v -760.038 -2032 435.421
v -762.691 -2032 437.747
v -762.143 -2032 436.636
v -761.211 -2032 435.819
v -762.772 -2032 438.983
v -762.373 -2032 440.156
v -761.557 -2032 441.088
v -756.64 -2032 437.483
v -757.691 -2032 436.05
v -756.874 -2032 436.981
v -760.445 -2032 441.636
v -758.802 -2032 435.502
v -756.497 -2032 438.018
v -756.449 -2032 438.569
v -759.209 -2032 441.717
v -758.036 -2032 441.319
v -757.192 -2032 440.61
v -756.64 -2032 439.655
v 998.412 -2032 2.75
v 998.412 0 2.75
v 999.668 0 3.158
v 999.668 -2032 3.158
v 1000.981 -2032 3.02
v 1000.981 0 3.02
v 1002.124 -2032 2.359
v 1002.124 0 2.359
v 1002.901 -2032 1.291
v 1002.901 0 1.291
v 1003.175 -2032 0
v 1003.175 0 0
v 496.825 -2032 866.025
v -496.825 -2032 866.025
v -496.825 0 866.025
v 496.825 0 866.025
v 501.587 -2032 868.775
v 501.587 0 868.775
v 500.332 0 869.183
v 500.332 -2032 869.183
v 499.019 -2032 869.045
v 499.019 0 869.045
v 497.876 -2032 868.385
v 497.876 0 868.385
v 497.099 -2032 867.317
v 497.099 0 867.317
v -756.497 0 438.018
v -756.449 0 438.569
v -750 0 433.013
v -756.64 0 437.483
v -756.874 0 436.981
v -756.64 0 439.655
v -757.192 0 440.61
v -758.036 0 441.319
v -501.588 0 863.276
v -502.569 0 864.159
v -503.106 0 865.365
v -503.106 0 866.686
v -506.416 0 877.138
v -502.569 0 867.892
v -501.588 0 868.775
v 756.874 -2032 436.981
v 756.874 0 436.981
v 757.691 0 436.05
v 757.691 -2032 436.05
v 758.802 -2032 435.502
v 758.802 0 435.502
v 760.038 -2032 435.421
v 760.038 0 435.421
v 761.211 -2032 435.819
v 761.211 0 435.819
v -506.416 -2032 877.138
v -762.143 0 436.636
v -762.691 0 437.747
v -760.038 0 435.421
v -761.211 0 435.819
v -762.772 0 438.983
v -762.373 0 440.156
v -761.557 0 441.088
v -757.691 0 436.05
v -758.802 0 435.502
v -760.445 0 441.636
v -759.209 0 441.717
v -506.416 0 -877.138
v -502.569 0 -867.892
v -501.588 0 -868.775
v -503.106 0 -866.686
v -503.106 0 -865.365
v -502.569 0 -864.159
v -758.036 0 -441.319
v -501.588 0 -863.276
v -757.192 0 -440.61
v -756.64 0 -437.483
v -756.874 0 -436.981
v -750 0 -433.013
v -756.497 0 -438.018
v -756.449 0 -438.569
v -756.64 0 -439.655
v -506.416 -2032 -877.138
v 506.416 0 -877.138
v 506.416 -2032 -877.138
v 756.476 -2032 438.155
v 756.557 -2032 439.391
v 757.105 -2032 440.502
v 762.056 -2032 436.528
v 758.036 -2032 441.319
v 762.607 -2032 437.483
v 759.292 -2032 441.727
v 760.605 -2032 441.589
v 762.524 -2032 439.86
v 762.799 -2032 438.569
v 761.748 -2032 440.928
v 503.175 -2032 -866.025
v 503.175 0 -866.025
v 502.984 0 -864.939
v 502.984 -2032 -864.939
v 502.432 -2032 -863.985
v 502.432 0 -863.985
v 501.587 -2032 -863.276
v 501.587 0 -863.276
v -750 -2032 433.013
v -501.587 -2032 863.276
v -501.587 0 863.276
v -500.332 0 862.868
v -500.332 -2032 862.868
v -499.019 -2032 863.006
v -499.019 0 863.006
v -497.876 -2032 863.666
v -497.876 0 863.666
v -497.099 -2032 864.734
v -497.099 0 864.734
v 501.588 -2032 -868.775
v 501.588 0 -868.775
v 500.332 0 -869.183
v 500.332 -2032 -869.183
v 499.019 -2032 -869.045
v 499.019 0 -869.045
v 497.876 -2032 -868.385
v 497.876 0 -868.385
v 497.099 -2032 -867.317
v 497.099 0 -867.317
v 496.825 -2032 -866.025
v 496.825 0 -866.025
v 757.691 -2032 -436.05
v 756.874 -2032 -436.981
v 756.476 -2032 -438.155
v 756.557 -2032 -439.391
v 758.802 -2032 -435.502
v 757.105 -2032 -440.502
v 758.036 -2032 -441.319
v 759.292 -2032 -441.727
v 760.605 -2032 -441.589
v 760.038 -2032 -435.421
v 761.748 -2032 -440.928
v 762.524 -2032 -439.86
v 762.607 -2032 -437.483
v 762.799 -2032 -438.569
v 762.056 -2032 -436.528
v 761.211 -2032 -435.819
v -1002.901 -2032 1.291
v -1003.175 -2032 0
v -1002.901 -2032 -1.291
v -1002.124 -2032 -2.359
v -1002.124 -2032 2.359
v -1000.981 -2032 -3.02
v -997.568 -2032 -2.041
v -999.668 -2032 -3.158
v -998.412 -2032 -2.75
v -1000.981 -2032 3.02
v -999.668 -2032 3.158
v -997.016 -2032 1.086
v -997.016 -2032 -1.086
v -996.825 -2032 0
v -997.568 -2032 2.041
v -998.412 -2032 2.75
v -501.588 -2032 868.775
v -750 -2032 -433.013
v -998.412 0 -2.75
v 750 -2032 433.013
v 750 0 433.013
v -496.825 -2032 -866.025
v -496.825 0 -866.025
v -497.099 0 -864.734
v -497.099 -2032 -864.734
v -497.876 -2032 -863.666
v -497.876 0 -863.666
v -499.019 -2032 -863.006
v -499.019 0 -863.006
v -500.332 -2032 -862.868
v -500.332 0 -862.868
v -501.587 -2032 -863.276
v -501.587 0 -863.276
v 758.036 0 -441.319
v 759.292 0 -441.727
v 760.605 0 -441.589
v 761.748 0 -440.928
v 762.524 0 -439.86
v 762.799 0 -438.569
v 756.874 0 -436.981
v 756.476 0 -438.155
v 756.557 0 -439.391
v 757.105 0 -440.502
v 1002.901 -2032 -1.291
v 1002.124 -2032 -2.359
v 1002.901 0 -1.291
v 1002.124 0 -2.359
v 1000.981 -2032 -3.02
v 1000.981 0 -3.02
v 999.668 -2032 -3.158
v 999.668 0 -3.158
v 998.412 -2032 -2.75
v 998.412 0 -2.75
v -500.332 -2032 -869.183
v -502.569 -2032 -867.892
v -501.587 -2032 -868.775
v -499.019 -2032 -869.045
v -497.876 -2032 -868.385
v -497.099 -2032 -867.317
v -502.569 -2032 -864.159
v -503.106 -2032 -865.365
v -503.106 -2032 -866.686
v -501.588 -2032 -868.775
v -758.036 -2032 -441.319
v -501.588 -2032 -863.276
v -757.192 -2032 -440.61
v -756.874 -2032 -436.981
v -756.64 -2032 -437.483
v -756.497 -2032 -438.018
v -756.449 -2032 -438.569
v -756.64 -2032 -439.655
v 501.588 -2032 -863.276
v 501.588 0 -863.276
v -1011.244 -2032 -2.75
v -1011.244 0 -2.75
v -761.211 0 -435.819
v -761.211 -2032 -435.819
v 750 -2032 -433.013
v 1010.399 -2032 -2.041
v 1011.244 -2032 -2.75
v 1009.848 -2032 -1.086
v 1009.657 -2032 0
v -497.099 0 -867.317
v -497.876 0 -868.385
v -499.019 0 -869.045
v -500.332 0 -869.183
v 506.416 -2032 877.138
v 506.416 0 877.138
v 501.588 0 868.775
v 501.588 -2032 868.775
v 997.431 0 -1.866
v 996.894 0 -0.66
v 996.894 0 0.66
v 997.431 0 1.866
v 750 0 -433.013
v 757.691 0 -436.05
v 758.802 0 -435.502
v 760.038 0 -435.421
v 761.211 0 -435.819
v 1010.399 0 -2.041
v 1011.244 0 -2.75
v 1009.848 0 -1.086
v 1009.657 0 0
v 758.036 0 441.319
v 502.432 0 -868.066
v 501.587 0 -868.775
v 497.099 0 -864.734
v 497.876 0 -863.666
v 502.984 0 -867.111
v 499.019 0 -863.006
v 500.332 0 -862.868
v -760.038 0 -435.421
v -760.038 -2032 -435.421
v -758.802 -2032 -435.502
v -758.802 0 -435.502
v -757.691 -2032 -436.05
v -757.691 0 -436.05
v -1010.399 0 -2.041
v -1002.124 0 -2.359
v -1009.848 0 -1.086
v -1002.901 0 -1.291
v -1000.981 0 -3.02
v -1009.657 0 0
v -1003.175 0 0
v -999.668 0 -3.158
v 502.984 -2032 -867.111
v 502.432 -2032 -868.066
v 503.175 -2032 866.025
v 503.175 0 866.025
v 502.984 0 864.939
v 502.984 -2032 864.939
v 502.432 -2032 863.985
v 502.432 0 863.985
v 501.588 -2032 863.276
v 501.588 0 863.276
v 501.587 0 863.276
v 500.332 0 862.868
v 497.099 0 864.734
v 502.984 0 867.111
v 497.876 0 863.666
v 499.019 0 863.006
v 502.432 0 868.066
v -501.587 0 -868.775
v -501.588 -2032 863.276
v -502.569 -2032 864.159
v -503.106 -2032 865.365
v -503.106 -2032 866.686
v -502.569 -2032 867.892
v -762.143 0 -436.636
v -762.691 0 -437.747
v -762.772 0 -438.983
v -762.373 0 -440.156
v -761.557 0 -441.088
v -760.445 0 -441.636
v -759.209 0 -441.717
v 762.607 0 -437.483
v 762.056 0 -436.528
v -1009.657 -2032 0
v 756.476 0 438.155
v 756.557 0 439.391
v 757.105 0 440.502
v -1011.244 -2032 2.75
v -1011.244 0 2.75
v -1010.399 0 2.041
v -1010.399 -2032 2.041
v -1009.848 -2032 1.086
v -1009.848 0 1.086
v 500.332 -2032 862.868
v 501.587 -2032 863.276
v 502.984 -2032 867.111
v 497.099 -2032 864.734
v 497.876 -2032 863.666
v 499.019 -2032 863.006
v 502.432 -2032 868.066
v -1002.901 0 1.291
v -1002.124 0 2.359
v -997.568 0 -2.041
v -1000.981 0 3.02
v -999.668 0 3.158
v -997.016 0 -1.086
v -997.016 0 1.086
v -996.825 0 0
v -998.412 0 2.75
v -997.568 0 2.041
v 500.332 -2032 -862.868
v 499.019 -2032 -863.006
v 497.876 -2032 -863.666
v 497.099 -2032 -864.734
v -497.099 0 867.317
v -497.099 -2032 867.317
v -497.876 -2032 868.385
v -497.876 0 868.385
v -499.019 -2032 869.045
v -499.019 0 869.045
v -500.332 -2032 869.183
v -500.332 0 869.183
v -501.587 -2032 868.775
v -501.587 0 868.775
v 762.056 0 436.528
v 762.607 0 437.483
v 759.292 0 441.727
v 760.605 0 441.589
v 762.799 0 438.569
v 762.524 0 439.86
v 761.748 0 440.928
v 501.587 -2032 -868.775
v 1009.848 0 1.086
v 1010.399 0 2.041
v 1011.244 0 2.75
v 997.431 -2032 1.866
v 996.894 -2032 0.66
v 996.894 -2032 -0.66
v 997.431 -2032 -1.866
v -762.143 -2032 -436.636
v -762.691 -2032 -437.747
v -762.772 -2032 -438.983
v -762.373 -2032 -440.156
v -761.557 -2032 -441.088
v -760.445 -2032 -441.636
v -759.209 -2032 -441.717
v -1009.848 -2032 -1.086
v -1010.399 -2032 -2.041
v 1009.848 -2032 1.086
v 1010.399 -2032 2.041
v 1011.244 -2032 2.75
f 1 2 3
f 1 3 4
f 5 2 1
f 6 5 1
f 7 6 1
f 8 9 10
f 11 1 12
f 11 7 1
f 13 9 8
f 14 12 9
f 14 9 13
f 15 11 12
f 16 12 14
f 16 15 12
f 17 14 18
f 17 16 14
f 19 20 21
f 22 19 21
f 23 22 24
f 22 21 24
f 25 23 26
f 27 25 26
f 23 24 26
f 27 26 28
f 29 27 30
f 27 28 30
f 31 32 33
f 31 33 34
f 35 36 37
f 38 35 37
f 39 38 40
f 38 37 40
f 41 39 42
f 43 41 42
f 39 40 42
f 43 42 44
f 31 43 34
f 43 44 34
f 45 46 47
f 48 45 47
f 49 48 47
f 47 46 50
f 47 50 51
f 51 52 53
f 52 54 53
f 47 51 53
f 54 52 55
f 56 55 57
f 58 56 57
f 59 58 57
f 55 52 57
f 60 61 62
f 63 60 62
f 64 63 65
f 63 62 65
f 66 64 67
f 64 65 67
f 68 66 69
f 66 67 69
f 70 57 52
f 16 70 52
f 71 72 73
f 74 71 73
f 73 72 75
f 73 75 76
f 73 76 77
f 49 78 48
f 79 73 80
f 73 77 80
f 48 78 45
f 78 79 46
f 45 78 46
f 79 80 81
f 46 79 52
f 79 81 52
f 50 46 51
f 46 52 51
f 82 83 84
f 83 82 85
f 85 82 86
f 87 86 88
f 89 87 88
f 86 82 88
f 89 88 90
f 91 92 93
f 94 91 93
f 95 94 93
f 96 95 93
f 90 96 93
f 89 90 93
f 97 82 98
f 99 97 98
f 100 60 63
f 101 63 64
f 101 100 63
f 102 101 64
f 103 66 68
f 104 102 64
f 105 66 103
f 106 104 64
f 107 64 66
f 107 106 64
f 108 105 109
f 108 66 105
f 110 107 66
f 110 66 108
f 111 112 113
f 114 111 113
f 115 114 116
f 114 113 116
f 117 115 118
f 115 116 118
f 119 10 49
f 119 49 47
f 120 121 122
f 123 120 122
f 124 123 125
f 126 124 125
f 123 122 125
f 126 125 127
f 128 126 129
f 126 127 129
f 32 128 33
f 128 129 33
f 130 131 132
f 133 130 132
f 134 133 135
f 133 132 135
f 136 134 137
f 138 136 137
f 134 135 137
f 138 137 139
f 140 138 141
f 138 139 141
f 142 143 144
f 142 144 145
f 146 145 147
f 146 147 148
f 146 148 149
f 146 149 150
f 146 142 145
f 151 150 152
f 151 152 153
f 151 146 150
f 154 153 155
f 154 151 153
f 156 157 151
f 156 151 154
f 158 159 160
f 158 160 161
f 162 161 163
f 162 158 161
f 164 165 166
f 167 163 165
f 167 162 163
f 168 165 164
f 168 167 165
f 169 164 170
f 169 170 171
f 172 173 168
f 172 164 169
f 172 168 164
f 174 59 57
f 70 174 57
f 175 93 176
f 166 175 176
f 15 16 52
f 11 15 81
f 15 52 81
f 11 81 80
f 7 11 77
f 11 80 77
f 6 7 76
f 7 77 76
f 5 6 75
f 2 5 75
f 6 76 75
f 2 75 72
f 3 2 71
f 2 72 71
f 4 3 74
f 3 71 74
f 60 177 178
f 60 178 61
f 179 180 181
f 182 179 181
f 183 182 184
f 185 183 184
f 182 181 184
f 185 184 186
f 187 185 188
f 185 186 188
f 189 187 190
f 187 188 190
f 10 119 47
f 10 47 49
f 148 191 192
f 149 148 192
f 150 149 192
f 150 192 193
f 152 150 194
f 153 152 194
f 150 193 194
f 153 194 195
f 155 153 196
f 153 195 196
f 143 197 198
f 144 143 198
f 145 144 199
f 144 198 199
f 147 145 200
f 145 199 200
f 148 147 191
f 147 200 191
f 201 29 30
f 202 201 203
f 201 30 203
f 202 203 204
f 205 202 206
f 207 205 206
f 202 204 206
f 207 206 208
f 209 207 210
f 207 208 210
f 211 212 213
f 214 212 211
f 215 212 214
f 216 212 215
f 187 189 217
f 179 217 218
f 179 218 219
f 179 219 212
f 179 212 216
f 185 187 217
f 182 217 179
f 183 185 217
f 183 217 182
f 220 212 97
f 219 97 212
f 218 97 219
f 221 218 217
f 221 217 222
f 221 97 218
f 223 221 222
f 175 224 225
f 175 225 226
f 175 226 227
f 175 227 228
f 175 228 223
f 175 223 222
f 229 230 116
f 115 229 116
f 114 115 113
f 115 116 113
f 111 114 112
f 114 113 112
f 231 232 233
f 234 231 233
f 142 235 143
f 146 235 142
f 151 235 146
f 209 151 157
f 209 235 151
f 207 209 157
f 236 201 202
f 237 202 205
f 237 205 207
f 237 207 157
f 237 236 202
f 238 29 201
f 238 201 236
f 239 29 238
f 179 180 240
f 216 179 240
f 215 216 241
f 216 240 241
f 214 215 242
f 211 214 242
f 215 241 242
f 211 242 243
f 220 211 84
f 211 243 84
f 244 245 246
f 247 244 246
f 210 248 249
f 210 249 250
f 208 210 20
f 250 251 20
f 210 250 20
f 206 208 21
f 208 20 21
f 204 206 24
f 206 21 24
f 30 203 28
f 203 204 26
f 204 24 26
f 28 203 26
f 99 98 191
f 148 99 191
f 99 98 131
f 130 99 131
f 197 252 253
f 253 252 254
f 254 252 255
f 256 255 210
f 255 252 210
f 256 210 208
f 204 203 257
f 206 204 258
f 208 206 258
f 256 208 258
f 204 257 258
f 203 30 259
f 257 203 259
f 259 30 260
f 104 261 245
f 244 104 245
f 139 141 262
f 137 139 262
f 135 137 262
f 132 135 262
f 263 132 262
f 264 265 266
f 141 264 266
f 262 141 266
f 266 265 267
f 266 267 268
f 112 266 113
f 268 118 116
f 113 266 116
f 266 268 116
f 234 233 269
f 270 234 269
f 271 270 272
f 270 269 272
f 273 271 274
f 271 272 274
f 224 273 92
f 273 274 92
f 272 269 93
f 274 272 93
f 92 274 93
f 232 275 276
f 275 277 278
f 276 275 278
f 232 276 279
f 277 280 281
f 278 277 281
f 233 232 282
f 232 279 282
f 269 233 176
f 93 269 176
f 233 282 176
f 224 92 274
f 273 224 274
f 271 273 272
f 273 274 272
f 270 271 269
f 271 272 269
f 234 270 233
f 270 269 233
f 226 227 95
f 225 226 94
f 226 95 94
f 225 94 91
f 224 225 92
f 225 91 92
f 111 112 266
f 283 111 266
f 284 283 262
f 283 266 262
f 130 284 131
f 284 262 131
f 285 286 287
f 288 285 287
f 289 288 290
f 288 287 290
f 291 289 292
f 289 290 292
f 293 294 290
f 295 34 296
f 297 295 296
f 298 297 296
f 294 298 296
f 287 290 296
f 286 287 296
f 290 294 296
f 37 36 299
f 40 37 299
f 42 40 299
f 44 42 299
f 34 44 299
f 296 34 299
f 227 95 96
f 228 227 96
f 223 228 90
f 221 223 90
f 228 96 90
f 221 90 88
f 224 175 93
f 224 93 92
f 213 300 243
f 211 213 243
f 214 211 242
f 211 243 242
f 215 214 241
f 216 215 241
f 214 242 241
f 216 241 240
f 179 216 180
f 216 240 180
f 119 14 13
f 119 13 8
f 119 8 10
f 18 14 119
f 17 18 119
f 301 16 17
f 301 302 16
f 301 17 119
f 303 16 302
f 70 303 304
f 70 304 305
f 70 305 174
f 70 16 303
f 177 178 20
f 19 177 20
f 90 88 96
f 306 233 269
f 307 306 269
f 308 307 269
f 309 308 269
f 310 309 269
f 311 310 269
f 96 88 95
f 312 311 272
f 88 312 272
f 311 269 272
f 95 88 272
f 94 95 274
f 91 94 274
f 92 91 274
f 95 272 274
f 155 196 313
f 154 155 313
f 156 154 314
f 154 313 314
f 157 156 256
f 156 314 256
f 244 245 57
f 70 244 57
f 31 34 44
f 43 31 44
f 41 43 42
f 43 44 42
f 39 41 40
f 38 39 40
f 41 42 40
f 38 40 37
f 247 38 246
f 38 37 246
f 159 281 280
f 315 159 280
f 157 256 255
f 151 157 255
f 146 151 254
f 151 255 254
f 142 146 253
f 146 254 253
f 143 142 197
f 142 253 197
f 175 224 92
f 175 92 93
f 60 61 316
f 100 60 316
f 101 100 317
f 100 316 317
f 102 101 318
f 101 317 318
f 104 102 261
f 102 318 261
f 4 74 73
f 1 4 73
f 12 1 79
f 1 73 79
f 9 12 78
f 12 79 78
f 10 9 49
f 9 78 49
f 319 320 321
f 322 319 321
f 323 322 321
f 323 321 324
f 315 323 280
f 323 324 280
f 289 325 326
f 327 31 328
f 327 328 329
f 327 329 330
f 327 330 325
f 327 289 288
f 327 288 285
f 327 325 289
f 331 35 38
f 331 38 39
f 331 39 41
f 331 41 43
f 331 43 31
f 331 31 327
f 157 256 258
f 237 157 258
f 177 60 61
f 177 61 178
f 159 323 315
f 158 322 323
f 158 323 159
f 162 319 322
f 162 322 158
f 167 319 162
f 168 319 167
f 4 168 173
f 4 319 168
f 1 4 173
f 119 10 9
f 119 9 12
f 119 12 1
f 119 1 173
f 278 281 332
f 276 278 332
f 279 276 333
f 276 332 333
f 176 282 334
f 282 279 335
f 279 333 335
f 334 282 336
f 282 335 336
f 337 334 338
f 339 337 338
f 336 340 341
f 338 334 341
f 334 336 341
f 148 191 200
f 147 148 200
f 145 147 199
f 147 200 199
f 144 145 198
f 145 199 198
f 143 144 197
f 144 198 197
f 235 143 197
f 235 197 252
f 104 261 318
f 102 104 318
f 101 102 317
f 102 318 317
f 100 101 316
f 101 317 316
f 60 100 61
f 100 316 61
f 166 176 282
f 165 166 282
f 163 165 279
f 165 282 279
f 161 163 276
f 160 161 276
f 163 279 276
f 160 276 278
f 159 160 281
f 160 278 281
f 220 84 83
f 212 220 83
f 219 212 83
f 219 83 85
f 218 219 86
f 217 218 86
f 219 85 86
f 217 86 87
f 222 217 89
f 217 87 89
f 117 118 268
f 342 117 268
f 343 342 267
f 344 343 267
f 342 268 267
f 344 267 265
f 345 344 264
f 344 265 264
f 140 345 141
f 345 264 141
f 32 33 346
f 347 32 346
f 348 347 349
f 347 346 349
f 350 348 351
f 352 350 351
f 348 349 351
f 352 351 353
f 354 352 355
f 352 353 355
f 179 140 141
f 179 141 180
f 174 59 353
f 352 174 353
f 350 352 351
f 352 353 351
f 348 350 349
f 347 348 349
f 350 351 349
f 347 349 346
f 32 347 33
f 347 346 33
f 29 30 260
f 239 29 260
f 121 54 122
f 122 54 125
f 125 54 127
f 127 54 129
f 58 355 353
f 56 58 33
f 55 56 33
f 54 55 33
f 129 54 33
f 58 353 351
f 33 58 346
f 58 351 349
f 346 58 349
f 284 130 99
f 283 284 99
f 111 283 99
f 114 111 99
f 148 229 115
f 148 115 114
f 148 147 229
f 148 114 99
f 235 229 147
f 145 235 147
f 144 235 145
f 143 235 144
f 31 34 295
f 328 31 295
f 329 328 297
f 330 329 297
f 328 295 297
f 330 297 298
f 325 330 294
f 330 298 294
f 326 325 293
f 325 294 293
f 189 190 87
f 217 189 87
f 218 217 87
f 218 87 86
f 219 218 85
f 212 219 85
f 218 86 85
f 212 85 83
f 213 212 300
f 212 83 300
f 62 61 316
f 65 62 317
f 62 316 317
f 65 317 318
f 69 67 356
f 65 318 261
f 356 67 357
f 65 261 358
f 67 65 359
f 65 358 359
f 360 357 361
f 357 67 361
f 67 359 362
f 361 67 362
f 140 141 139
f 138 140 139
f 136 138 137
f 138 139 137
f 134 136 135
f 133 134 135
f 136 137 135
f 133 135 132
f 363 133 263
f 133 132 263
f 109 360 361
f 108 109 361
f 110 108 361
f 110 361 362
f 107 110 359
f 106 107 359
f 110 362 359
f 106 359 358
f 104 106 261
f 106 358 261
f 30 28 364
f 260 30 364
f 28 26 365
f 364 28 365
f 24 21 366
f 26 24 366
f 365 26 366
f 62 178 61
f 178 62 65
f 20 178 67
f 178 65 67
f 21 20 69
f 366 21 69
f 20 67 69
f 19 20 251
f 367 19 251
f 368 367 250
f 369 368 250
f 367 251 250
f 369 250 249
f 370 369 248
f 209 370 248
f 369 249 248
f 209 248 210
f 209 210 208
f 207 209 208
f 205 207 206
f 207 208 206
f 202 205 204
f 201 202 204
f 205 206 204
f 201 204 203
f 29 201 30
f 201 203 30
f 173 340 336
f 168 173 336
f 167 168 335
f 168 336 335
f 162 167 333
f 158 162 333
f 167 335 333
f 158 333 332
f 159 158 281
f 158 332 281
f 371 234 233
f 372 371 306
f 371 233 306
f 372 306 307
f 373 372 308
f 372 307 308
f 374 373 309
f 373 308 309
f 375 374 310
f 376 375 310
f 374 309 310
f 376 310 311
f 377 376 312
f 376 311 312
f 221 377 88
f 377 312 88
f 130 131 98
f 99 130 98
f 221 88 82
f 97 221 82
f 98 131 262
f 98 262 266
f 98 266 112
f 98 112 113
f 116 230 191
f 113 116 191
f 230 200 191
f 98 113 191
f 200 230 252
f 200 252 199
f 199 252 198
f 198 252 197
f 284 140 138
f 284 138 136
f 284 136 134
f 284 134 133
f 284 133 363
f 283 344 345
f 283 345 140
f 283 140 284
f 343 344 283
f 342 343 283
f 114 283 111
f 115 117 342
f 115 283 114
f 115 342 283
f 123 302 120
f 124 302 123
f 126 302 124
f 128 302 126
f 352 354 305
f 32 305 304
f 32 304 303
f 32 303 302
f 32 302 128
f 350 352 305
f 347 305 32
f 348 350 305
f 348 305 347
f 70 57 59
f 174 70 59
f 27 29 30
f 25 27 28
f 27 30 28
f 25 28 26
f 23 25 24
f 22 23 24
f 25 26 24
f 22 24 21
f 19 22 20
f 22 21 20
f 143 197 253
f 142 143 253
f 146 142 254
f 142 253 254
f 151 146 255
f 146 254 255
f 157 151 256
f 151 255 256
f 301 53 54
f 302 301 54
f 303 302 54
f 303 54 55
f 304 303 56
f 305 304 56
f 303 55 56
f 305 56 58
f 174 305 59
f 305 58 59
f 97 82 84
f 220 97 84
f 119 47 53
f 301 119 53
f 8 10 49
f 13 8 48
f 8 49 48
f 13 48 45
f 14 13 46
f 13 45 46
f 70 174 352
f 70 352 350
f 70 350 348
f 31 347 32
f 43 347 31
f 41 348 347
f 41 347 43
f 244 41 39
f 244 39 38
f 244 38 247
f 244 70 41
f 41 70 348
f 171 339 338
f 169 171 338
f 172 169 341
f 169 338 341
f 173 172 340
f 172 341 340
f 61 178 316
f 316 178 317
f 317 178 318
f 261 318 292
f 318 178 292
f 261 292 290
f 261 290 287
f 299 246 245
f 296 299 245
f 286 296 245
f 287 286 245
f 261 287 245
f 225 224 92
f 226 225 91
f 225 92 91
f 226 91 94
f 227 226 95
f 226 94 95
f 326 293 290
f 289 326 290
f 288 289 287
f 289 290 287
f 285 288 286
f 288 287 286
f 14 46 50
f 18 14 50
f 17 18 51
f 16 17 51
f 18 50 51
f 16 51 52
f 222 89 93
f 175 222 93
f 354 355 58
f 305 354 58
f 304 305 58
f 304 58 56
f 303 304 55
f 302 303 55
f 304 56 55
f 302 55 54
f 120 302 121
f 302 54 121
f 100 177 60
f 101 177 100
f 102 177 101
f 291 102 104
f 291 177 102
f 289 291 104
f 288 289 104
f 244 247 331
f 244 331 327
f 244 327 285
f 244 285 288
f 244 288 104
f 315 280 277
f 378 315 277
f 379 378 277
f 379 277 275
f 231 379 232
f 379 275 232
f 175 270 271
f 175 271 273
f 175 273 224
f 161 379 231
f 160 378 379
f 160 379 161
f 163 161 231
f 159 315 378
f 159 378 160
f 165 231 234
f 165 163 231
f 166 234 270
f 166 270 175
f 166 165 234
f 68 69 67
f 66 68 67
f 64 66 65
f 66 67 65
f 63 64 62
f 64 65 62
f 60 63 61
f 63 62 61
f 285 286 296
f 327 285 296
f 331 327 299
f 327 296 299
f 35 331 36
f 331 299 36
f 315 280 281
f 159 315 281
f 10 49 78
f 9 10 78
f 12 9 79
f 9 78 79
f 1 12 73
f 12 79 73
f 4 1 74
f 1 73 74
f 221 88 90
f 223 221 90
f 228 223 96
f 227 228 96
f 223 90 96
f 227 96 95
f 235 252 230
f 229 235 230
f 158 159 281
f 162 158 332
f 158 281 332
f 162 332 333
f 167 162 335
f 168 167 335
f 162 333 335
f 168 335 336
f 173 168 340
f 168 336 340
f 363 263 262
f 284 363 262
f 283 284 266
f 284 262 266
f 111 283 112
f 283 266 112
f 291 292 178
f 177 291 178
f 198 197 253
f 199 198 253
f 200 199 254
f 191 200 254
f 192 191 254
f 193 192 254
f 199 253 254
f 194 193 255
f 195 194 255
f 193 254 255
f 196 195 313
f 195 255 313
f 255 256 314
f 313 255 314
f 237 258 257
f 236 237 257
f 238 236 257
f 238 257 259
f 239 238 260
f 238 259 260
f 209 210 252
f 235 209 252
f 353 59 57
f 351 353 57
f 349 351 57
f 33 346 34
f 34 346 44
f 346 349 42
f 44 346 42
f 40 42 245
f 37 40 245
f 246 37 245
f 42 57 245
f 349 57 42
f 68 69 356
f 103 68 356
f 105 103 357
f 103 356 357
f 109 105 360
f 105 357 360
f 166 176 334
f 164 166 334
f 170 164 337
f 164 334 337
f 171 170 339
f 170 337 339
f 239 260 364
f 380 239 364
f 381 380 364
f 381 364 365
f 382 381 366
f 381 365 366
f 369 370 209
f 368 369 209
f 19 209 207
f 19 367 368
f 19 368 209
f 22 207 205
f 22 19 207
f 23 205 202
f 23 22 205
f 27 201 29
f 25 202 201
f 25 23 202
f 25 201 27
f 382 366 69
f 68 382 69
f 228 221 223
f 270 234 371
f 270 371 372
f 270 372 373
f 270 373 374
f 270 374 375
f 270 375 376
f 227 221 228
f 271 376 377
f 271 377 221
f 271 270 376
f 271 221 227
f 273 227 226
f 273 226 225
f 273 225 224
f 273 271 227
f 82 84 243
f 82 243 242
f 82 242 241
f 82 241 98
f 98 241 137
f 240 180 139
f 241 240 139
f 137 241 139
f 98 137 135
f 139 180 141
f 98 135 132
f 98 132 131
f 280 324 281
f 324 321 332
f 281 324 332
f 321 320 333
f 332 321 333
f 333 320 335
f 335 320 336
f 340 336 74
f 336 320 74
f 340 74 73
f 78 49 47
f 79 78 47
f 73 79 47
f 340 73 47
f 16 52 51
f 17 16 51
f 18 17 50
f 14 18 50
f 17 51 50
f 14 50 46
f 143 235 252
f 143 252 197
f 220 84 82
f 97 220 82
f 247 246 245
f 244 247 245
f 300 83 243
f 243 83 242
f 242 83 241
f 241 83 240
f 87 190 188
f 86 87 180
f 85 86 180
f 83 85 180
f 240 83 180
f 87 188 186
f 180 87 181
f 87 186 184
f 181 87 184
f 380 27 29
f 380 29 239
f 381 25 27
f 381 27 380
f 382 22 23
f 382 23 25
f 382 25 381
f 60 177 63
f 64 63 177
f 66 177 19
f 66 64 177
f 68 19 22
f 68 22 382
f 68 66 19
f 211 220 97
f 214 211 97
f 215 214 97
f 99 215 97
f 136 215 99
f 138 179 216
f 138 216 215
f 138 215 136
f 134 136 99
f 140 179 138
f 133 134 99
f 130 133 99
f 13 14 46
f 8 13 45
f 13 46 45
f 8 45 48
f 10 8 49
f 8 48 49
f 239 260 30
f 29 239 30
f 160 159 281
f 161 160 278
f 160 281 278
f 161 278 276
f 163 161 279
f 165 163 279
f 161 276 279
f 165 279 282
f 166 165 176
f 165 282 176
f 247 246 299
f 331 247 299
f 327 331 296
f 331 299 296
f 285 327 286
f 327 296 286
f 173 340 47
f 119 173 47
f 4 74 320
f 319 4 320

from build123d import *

# Parameters (mm, degrees)
F1_DEPTH = 2032
F2_DEPTH = 2032
F3_DEPTH = 2032


with BuildPart() as f1:
    # F0 (on Front) → F1 (new body)
    with BuildSketch(Plane.XZ):
        with BuildLine():
            Line((496.825, -866.0254037844), (-496.825, -866.0254037844))
            ThreePointArc((-496.825, -866.0254037844), (-498.4125, -868.7750344415), (-501.5875, -868.7750344415))
            Line((-501.5875, -868.7750344415), (-506.4158048664, -877.1379037844))
            Line((-506.4158048664, -877.1379037844), (506.4158048664, -877.1379037844))
            Line((506.4158048664, -877.1379037844), (501.5875, -868.7750344415))
            ThreePointArc((501.5875, -868.7750344415), (498.4125, -868.7750344415), (496.825, -866.0254037844))
        make_face()
    extrude(amount=F1_DEPTH)


with BuildPart() as f1b:
    # F0 (on Front) → F1, piece 2 (new body)
    with BuildSketch(Plane.XZ):
        with BuildLine():
            Line((998.4125, -2.749630657), (750, -433.0127018922))
            Line((750, -433.0127018922), (756.8740766425, -436.9814518922))
            ThreePointArc((756.8740766425, -436.9814518922), (758.8019568314, -435.5021373938), (761.2112072996, -435.8193212352))
            Line((761.2112072996, -435.8193212352), (1011.2441097327, -2.749630657))
            ThreePointArc((1011.2441097327, -2.749630657), (1010.0819790757, -1.5875), (1009.6566097327, 0))
            Line((1009.6566097327, 0), (1003.175, 0))
            ThreePointArc((1003.175, 0), (1001.5875, -2.749630657), (998.4125, -2.749630657))
        make_face()
    extrude(amount=F1_DEPTH)


with BuildPart() as f1c:
    # F0 (on Front) → F1, piece 3 (new body)
    with BuildSketch(Plane.XZ):
        with BuildLine():
            Line((501.5875, 863.2757731274), (750, 433.0127018922))
            Line((750, 433.0127018922), (756.8740766425, 436.9814518922))
            ThreePointArc((756.8740766425, 436.9814518922), (756.5568928011, 439.3907023604), (758.0362072996, 441.3185825492))
            Line((758.0362072996, 441.3185825492), (506.4158048664, 877.1379037844))
            Line((506.4158048664, 877.1379037844), (501.5875, 868.7750344415))
            ThreePointArc((501.5875, 868.7750344415), (502.749630657, 867.6129037844), (503.175, 866.0254037844))
            ThreePointArc((503.175, 866.0254037844), (502.749630657, 864.4379037844), (501.5875, 863.2757731274))
        make_face()
    extrude(amount=F1_DEPTH)


with BuildPart() as f1d:
    # F0 (on Front) → F1, piece 4 (new body)
    with BuildSketch(Plane.XZ):
        with BuildLine():
            Line((-756.8740766425, -436.9814518922), (-750, -433.0127018922))
            Line((-750, -433.0127018922), (-998.4125, -2.749630657))
            ThreePointArc((-998.4125, -2.749630657), (-1001.5875, -2.749630657), (-1003.175, 0))
            Line((-1003.175, 0), (-1009.6566097327, 0))
            ThreePointArc((-1009.6566097327, 0), (-1010.0819790757, -1.5875), (-1011.2441097327, -2.749630657))
            Line((-1011.2441097327, -2.749630657), (-761.2112072996, -435.8193212352))
            ThreePointArc((-761.2112072996, -435.8193212352), (-758.8019568314, -435.5021373938), (-756.8740766425, -436.9814518922))
        make_face()
    extrude(amount=F1_DEPTH)


with BuildPart() as f1e:
    # F0 (on Front) → F1, piece 5 (new body)
    with BuildSketch(Plane.XZ):
        with BuildLine():
            Line((-756.8740766425, 436.9814518922), (-750, 433.0127018922))
            Line((-750, 433.0127018922), (-501.5875, 863.2757731274))
            ThreePointArc((-501.5875, 863.2757731274), (-503.175, 866.0254037844), (-501.5875, 868.7750344415))
            Line((-501.5875, 868.7750344415), (-506.4158048664, 877.1379037844))
            Line((-506.4158048664, 877.1379037844), (-758.0362072996, 441.3185825492))
            ThreePointArc((-758.0362072996, 441.3185825492), (-756.8740766425, 440.1564518922), (-756.4487072996, 438.5689518922))
            ThreePointArc((-756.4487072996, 438.5689518922), (-756.5568928011, 437.747201424), (-756.8740766425, 436.9814518922))
        make_face()
    extrude(amount=F1_DEPTH)


with BuildPart() as f2:
    # F0 (on Front) → F2 (new body)
    with BuildSketch(Plane.XZ):
        with BuildLine():
            Line((750, 433.0127018922), (998.4125, 2.749630657))
            ThreePointArc((998.4125, 2.749630657), (1001.5875, 2.749630657), (1003.175, 0))
            Line((1003.175, 0), (1009.6566097327, 0))
            ThreePointArc((1009.6566097327, 0), (1010.0819790757, 1.5875), (1011.2441097327, 2.749630657))
            Line((1011.2441097327, 2.749630657), (761.2112072996, 435.8193212352))
            ThreePointArc((761.2112072996, 435.8193212352), (758.8019568314, 435.5021373938), (756.8740766425, 436.9814518922))
            Line((756.8740766425, 436.9814518922), (750, 433.0127018922))
        make_face()
    extrude(amount=F2_DEPTH)


with BuildPart() as f2b:
    # F0 (on Front) → F2, piece 2 (new body)
    with BuildSketch(Plane.XZ):
        with BuildLine():
            Line((-496.825, 866.0254037844), (496.825, 866.0254037844))
            ThreePointArc((496.825, 866.0254037844), (498.4125, 868.7750344415), (501.5875, 868.7750344415))
            Line((501.5875, 868.7750344415), (506.4158048664, 877.1379037844))
            Line((506.4158048664, 877.1379037844), (-506.4158048664, 877.1379037844))
            Line((-506.4158048664, 877.1379037844), (-501.5875, 868.7750344415))
            ThreePointArc((-501.5875, 868.7750344415), (-498.4125, 868.7750344415), (-496.825, 866.0254037844))
        make_face()
    extrude(amount=F2_DEPTH)


with BuildPart() as f2c:
    # F0 (on Front) → F2, piece 3 (new body)
    with BuildSketch(Plane.XZ):
        with BuildLine():
            Line((-1009.6566097327, 0), (-1003.175, 0))
            ThreePointArc((-1003.175, 0), (-1001.5875, 2.749630657), (-998.4125, 2.749630657))
            Line((-998.4125, 2.749630657), (-750, 433.0127018922))
            Line((-750, 433.0127018922), (-756.8740766425, 436.9814518922))
            ThreePointArc((-756.8740766425, 436.9814518922), (-758.8019568314, 435.5021373938), (-761.2112072996, 435.8193212352))
            Line((-761.2112072996, 435.8193212352), (-1011.2441097327, 2.749630657))
            ThreePointArc((-1011.2441097327, 2.749630657), (-1010.0819790757, 1.5875), (-1009.6566097327, 0))
        make_face()
    extrude(amount=F2_DEPTH)


with BuildPart() as f2d:
    # F0 (on Front) → F2, piece 4 (new body)
    with BuildSketch(Plane.XZ):
        with BuildLine():
            ThreePointArc((-501.5875, -868.7750344415), (-503.175, -866.0254037844), (-501.5875, -863.2757731274))
            Line((-501.5875, -863.2757731274), (-750, -433.0127018922))
            Line((-750, -433.0127018922), (-756.8740766425, -436.9814518922))
            ThreePointArc((-756.8740766425, -436.9814518922), (-756.5568928011, -437.747201424), (-756.4487072996, -438.5689518922))
            ThreePointArc((-756.4487072996, -438.5689518922), (-756.8740766425, -440.1564518922), (-758.0362072996, -441.3185825492))
            Line((-758.0362072996, -441.3185825492), (-506.4158048664, -877.1379037844))
            Line((-506.4158048664, -877.1379037844), (-501.5875, -868.7750344415))
        make_face()
    extrude(amount=F2_DEPTH)


with BuildPart() as f2e:
    # F0 (on Front) → F2, piece 5 (new body)
    with BuildSketch(Plane.XZ):
        with BuildLine():
            Line((750, -433.0127018922), (501.5875, -863.2757731274))
            ThreePointArc((501.5875, -863.2757731274), (502.749630657, -864.4379037844), (503.175, -866.0254037844))
            ThreePointArc((503.175, -866.0254037844), (502.749630657, -867.6129037844), (501.5875, -868.7750344415))
            Line((501.5875, -868.7750344415), (506.4158048664, -877.1379037844))
            Line((506.4158048664, -877.1379037844), (758.0362072996, -441.3185825492))
            ThreePointArc((758.0362072996, -441.3185825492), (756.5568928011, -439.3907023604), (756.8740766425, -436.9814518922))
            Line((756.8740766425, -436.9814518922), (750, -433.0127018922))
        make_face()
    extrude(amount=F2_DEPTH)


with BuildPart() as f3:
    # F0 (on Front) → F3 (new body)
    with BuildSketch(Plane.XZ):
        with BuildLine():
            ThreePointArc((-761.2112072996, -435.8193212352), (-762.3733379566, -440.1564518922), (-758.0362072996, -441.3185825492))
            Line((-758.0362072996, -441.3185825492), (-759.6237072996, -438.5689518922))
            Line((-759.6237072996, -438.5689518922), (-761.2112072996, -435.8193212352))
        make_face()
        with BuildLine():
            Line((-759.6237072996, -438.5689518922), (-756.8740766425, -436.9814518922))
            ThreePointArc((-756.8740766425, -436.9814518922), (-758.8019568314, -435.5021373938), (-761.2112072996, -435.8193212352))
            Line((-761.2112072996, -435.8193212352), (-759.6237072996, -438.5689518922))
        make_face()
        with BuildLine():
            ThreePointArc((-756.4487072996, -438.5689518922), (-756.5568928011, -437.747201424), (-756.8740766425, -436.9814518922))
            Line((-756.8740766425, -436.9814518922), (-759.6237072996, -438.5689518922))
            Line((-759.6237072996, -438.5689518922), (-758.0362072996, -441.3185825492))
            ThreePointArc((-758.0362072996, -441.3185825492), (-756.8740766425, -440.1564518922), (-756.4487072996, -438.5689518922))
        make_face()
    extrude(amount=F3_DEPTH)


with BuildPart() as f3b:
    # F0 (on Front) → F3, piece 2 (new body)
    with BuildSketch(Plane.XZ):
        with BuildLine():
            Line((-500, -866.0254037844), (-496.825, -866.0254037844))
            ThreePointArc((-496.825, -866.0254037844), (-498.4125, -863.2757731274), (-501.5875, -863.2757731274))
            Line((-501.5875, -863.2757731274), (-500, -866.0254037844))
        make_face()
        with BuildLine():
            ThreePointArc((-501.5875, -868.7750344415), (-498.4125, -868.7750344415), (-496.825, -866.0254037844))
            Line((-496.825, -866.0254037844), (-500, -866.0254037844))
            Line((-500, -866.0254037844), (-501.5875, -868.7750344415))
        make_face()
        with BuildLine():
            Line((-501.5875, -868.7750344415), (-500, -866.0254037844))
            Line((-500, -866.0254037844), (-501.5875, -863.2757731274))
            ThreePointArc((-501.5875, -863.2757731274), (-503.175, -866.0254037844), (-501.5875, -868.7750344415))
        make_face()
    extrude(amount=F3_DEPTH)


with BuildPart() as f3c:
    # F0 (on Front) → F3, piece 3 (new body)
    with BuildSketch(Plane.XZ):
        with BuildLine():
            Line((501.5875, -863.2757731274), (500, -866.0254037844))
            Line((500, -866.0254037844), (501.5875, -868.7750344415))
            ThreePointArc((501.5875, -868.7750344415), (502.749630657, -867.6129037844), (503.175, -866.0254037844))
            ThreePointArc((503.175, -866.0254037844), (502.749630657, -864.4379037844), (501.5875, -863.2757731274))
        make_face()
        with BuildLine():
            ThreePointArc((501.5875, -863.2757731274), (498.4125, -863.2757731274), (496.825, -866.0254037844))
            Line((496.825, -866.0254037844), (500, -866.0254037844))
            Line((500, -866.0254037844), (501.5875, -863.2757731274))
        make_face()
        with BuildLine():
            Line((500, -866.0254037844), (496.825, -866.0254037844))
            ThreePointArc((496.825, -866.0254037844), (498.4125, -868.7750344415), (501.5875, -868.7750344415))
            Line((501.5875, -868.7750344415), (500, -866.0254037844))
        make_face()
    extrude(amount=F3_DEPTH)


with BuildPart() as f3d:
    # F0 (on Front) → F3, piece 4 (new body)
    with BuildSketch(Plane.XZ):
        with BuildLine():
            ThreePointArc((761.2112072996, -435.8193212352), (758.8019568314, -435.5021373938), (756.8740766425, -436.9814518922))
            Line((756.8740766425, -436.9814518922), (759.6237072996, -438.5689518922))
            Line((759.6237072996, -438.5689518922), (761.2112072996, -435.8193212352))
        make_face()
        with BuildLine():
            Line((759.6237072996, -438.5689518922), (756.8740766425, -436.9814518922))
            ThreePointArc((756.8740766425, -436.9814518922), (756.5568928011, -439.3907023604), (758.0362072996, -441.3185825492))
            Line((758.0362072996, -441.3185825492), (759.6237072996, -438.5689518922))
        make_face()
        with BuildLine():
            Line((759.6237072996, -438.5689518922), (758.0362072996, -441.3185825492))
            ThreePointArc((758.0362072996, -441.3185825492), (761.2112072996, -441.3185825492), (762.7987072996, -438.5689518922))
            ThreePointArc((762.7987072996, -438.5689518922), (762.3733379566, -436.9814518922), (761.2112072996, -435.8193212352))
            Line((761.2112072996, -435.8193212352), (759.6237072996, -438.5689518922))
        make_face()
    extrude(amount=F3_DEPTH)


with BuildPart() as f3e:
    # F0 (on Front) → F3, piece 5 (new body)
    with BuildSketch(Plane.XZ):
        with BuildLine():
            Line((998.4125, 2.749630657), (1000, 0))
            Line((1000, 0), (1003.175, 0))
            ThreePointArc((1003.175, 0), (1001.5875, 2.749630657), (998.4125, 2.749630657))
        make_face()
        with BuildLine():
            Line((1000, 0), (998.4125, -2.749630657))
            ThreePointArc((998.4125, -2.749630657), (1001.5875, -2.749630657), (1003.175, 0))
            Line((1003.175, 0), (1000, 0))
        make_face()
        with BuildLine():
            ThreePointArc((998.4125, 2.749630657), (996.825, 0), (998.4125, -2.749630657))
            Line((998.4125, -2.749630657), (1000, 0))
            Line((1000, 0), (998.4125, 2.749630657))
        make_face()
    extrude(amount=F3_DEPTH)


with BuildPart() as f3f:
    # F0 (on Front) → F3, piece 6 (new body)
    with BuildSketch(Plane.XZ):
        with BuildLine():
            Line((758.0362072996, 441.3185825492), (759.6237072996, 438.5689518922))
            Line((759.6237072996, 438.5689518922), (761.2112072996, 435.8193212352))
            ThreePointArc((761.2112072996, 435.8193212352), (762.3733379566, 436.9814518922), (762.7987072996, 438.5689518922))
            ThreePointArc((762.7987072996, 438.5689518922), (761.2112072996, 441.3185825492), (758.0362072996, 441.3185825492))
        make_face()
        with BuildLine():
            Line((759.6237072996, 438.5689518922), (756.8740766425, 436.9814518922))
            ThreePointArc((756.8740766425, 436.9814518922), (758.8019568314, 435.5021373938), (761.2112072996, 435.8193212352))
            Line((761.2112072996, 435.8193212352), (759.6237072996, 438.5689518922))
        make_face()
        with BuildLine():
            ThreePointArc((758.0362072996, 441.3185825492), (756.5568928011, 439.3907023604), (756.8740766425, 436.9814518922))
            Line((756.8740766425, 436.9814518922), (759.6237072996, 438.5689518922))
            Line((759.6237072996, 438.5689518922), (758.0362072996, 441.3185825492))
        make_face()
    extrude(amount=F3_DEPTH)


with BuildPart() as f3g:
    # F0 (on Front) → F3, piece 7 (new body)
    with BuildSketch(Plane.XZ):
        with BuildLine():
            Line((496.825, 866.0254037844), (500, 866.0254037844))
            Line((500, 866.0254037844), (501.5875, 868.7750344415))
            ThreePointArc((501.5875, 868.7750344415), (498.4125, 868.7750344415), (496.825, 866.0254037844))
        make_face()
        with BuildLine():
            ThreePointArc((496.825, 866.0254037844), (498.4125, 863.2757731274), (501.5875, 863.2757731274))
            Line((501.5875, 863.2757731274), (500, 866.0254037844))
            Line((500, 866.0254037844), (496.825, 866.0254037844))
        make_face()
        with BuildLine():
            Line((500, 866.0254037844), (501.5875, 863.2757731274))
            ThreePointArc((501.5875, 863.2757731274), (502.749630657, 864.4379037844), (503.175, 866.0254037844))
            ThreePointArc((503.175, 866.0254037844), (502.749630657, 867.6129037844), (501.5875, 868.7750344415))
            Line((501.5875, 868.7750344415), (500, 866.0254037844))
        make_face()
    extrude(amount=F3_DEPTH)


with BuildPart() as f3h:
    # F0 (on Front) → F3, piece 8 (new body)
    with BuildSketch(Plane.XZ):
        with BuildLine():
            Line((-500, 866.0254037844), (-501.5875, 863.2757731274))
            ThreePointArc((-501.5875, 863.2757731274), (-498.4125, 863.2757731274), (-496.825, 866.0254037844))
            Line((-496.825, 866.0254037844), (-500, 866.0254037844))
        make_face()
        with BuildLine():
            Line((-501.5875, 868.7750344415), (-500, 866.0254037844))
            Line((-500, 866.0254037844), (-496.825, 866.0254037844))
            ThreePointArc((-496.825, 866.0254037844), (-498.4125, 868.7750344415), (-501.5875, 868.7750344415))
        make_face()
        with BuildLine():
            ThreePointArc((-501.5875, 868.7750344415), (-503.175, 866.0254037844), (-501.5875, 863.2757731274))
            Line((-501.5875, 863.2757731274), (-500, 866.0254037844))
            Line((-500, 866.0254037844), (-501.5875, 868.7750344415))
        make_face()
    extrude(amount=F3_DEPTH)


with BuildPart() as f3i:
    # F0 (on Front) → F3, piece 9 (new body)
    with BuildSketch(Plane.XZ):
        with BuildLine():
            Line((-759.6237072996, 438.5689518922), (-756.8740766425, 436.9814518922))
            ThreePointArc((-756.8740766425, 436.9814518922), (-756.5568928011, 437.747201424), (-756.4487072996, 438.5689518922))
            ThreePointArc((-756.4487072996, 438.5689518922), (-756.8740766425, 440.1564518922), (-758.0362072996, 441.3185825492))
            Line((-758.0362072996, 441.3185825492), (-759.6237072996, 438.5689518922))
        make_face()
        with BuildLine():
            ThreePointArc((-758.0362072996, 441.3185825492), (-762.3733379566, 440.1564518922), (-761.2112072996, 435.8193212352))
            Line((-761.2112072996, 435.8193212352), (-759.6237072996, 438.5689518922))
            Line((-759.6237072996, 438.5689518922), (-758.0362072996, 441.3185825492))
        make_face()
        with BuildLine():
            ThreePointArc((-761.2112072996, 435.8193212352), (-758.8019568314, 435.5021373938), (-756.8740766425, 436.9814518922))
            Line((-756.8740766425, 436.9814518922), (-759.6237072996, 438.5689518922))
            Line((-759.6237072996, 438.5689518922), (-761.2112072996, 435.8193212352))
        make_face()
    extrude(amount=F3_DEPTH)


with BuildPart() as f3j:
    # F0 (on Front) → F3, piece 10 (new body)
    with BuildSketch(Plane.XZ):
        with BuildLine():
            Line((-1000, 0), (-998.4125, -2.749630657))
            ThreePointArc((-998.4125, -2.749630657), (-997.250369343, -1.5875), (-996.825, 0))
            ThreePointArc((-996.825, 0), (-997.250369343, 1.5875), (-998.4125, 2.749630657))
            Line((-998.4125, 2.749630657), (-1000, 0))
        make_face()
        with BuildLine():
            Line((-1003.175, 0), (-1000, 0))
            Line((-1000, 0), (-998.4125, 2.749630657))
            ThreePointArc((-998.4125, 2.749630657), (-1001.5875, 2.749630657), (-1003.175, 0))
        make_face()
        with BuildLine():
            ThreePointArc((-1003.175, 0), (-1001.5875, -2.749630657), (-998.4125, -2.749630657))
            Line((-998.4125, -2.749630657), (-1000, 0))
            Line((-1000, 0), (-1003.175, 0))
        make_face()
    extrude(amount=F3_DEPTH)


solid = Compound([f1.part, f1b.part, f1c.part, f1d.part, f1e.part, f2.part, f2b.part, f2c.part, f2d.part, f2e.part, f3.part, f3b.part, f3c.part, f3d.part, f3e.part, f3f.part, f3g.part, f3h.part, f3i.part, f3j.part])
